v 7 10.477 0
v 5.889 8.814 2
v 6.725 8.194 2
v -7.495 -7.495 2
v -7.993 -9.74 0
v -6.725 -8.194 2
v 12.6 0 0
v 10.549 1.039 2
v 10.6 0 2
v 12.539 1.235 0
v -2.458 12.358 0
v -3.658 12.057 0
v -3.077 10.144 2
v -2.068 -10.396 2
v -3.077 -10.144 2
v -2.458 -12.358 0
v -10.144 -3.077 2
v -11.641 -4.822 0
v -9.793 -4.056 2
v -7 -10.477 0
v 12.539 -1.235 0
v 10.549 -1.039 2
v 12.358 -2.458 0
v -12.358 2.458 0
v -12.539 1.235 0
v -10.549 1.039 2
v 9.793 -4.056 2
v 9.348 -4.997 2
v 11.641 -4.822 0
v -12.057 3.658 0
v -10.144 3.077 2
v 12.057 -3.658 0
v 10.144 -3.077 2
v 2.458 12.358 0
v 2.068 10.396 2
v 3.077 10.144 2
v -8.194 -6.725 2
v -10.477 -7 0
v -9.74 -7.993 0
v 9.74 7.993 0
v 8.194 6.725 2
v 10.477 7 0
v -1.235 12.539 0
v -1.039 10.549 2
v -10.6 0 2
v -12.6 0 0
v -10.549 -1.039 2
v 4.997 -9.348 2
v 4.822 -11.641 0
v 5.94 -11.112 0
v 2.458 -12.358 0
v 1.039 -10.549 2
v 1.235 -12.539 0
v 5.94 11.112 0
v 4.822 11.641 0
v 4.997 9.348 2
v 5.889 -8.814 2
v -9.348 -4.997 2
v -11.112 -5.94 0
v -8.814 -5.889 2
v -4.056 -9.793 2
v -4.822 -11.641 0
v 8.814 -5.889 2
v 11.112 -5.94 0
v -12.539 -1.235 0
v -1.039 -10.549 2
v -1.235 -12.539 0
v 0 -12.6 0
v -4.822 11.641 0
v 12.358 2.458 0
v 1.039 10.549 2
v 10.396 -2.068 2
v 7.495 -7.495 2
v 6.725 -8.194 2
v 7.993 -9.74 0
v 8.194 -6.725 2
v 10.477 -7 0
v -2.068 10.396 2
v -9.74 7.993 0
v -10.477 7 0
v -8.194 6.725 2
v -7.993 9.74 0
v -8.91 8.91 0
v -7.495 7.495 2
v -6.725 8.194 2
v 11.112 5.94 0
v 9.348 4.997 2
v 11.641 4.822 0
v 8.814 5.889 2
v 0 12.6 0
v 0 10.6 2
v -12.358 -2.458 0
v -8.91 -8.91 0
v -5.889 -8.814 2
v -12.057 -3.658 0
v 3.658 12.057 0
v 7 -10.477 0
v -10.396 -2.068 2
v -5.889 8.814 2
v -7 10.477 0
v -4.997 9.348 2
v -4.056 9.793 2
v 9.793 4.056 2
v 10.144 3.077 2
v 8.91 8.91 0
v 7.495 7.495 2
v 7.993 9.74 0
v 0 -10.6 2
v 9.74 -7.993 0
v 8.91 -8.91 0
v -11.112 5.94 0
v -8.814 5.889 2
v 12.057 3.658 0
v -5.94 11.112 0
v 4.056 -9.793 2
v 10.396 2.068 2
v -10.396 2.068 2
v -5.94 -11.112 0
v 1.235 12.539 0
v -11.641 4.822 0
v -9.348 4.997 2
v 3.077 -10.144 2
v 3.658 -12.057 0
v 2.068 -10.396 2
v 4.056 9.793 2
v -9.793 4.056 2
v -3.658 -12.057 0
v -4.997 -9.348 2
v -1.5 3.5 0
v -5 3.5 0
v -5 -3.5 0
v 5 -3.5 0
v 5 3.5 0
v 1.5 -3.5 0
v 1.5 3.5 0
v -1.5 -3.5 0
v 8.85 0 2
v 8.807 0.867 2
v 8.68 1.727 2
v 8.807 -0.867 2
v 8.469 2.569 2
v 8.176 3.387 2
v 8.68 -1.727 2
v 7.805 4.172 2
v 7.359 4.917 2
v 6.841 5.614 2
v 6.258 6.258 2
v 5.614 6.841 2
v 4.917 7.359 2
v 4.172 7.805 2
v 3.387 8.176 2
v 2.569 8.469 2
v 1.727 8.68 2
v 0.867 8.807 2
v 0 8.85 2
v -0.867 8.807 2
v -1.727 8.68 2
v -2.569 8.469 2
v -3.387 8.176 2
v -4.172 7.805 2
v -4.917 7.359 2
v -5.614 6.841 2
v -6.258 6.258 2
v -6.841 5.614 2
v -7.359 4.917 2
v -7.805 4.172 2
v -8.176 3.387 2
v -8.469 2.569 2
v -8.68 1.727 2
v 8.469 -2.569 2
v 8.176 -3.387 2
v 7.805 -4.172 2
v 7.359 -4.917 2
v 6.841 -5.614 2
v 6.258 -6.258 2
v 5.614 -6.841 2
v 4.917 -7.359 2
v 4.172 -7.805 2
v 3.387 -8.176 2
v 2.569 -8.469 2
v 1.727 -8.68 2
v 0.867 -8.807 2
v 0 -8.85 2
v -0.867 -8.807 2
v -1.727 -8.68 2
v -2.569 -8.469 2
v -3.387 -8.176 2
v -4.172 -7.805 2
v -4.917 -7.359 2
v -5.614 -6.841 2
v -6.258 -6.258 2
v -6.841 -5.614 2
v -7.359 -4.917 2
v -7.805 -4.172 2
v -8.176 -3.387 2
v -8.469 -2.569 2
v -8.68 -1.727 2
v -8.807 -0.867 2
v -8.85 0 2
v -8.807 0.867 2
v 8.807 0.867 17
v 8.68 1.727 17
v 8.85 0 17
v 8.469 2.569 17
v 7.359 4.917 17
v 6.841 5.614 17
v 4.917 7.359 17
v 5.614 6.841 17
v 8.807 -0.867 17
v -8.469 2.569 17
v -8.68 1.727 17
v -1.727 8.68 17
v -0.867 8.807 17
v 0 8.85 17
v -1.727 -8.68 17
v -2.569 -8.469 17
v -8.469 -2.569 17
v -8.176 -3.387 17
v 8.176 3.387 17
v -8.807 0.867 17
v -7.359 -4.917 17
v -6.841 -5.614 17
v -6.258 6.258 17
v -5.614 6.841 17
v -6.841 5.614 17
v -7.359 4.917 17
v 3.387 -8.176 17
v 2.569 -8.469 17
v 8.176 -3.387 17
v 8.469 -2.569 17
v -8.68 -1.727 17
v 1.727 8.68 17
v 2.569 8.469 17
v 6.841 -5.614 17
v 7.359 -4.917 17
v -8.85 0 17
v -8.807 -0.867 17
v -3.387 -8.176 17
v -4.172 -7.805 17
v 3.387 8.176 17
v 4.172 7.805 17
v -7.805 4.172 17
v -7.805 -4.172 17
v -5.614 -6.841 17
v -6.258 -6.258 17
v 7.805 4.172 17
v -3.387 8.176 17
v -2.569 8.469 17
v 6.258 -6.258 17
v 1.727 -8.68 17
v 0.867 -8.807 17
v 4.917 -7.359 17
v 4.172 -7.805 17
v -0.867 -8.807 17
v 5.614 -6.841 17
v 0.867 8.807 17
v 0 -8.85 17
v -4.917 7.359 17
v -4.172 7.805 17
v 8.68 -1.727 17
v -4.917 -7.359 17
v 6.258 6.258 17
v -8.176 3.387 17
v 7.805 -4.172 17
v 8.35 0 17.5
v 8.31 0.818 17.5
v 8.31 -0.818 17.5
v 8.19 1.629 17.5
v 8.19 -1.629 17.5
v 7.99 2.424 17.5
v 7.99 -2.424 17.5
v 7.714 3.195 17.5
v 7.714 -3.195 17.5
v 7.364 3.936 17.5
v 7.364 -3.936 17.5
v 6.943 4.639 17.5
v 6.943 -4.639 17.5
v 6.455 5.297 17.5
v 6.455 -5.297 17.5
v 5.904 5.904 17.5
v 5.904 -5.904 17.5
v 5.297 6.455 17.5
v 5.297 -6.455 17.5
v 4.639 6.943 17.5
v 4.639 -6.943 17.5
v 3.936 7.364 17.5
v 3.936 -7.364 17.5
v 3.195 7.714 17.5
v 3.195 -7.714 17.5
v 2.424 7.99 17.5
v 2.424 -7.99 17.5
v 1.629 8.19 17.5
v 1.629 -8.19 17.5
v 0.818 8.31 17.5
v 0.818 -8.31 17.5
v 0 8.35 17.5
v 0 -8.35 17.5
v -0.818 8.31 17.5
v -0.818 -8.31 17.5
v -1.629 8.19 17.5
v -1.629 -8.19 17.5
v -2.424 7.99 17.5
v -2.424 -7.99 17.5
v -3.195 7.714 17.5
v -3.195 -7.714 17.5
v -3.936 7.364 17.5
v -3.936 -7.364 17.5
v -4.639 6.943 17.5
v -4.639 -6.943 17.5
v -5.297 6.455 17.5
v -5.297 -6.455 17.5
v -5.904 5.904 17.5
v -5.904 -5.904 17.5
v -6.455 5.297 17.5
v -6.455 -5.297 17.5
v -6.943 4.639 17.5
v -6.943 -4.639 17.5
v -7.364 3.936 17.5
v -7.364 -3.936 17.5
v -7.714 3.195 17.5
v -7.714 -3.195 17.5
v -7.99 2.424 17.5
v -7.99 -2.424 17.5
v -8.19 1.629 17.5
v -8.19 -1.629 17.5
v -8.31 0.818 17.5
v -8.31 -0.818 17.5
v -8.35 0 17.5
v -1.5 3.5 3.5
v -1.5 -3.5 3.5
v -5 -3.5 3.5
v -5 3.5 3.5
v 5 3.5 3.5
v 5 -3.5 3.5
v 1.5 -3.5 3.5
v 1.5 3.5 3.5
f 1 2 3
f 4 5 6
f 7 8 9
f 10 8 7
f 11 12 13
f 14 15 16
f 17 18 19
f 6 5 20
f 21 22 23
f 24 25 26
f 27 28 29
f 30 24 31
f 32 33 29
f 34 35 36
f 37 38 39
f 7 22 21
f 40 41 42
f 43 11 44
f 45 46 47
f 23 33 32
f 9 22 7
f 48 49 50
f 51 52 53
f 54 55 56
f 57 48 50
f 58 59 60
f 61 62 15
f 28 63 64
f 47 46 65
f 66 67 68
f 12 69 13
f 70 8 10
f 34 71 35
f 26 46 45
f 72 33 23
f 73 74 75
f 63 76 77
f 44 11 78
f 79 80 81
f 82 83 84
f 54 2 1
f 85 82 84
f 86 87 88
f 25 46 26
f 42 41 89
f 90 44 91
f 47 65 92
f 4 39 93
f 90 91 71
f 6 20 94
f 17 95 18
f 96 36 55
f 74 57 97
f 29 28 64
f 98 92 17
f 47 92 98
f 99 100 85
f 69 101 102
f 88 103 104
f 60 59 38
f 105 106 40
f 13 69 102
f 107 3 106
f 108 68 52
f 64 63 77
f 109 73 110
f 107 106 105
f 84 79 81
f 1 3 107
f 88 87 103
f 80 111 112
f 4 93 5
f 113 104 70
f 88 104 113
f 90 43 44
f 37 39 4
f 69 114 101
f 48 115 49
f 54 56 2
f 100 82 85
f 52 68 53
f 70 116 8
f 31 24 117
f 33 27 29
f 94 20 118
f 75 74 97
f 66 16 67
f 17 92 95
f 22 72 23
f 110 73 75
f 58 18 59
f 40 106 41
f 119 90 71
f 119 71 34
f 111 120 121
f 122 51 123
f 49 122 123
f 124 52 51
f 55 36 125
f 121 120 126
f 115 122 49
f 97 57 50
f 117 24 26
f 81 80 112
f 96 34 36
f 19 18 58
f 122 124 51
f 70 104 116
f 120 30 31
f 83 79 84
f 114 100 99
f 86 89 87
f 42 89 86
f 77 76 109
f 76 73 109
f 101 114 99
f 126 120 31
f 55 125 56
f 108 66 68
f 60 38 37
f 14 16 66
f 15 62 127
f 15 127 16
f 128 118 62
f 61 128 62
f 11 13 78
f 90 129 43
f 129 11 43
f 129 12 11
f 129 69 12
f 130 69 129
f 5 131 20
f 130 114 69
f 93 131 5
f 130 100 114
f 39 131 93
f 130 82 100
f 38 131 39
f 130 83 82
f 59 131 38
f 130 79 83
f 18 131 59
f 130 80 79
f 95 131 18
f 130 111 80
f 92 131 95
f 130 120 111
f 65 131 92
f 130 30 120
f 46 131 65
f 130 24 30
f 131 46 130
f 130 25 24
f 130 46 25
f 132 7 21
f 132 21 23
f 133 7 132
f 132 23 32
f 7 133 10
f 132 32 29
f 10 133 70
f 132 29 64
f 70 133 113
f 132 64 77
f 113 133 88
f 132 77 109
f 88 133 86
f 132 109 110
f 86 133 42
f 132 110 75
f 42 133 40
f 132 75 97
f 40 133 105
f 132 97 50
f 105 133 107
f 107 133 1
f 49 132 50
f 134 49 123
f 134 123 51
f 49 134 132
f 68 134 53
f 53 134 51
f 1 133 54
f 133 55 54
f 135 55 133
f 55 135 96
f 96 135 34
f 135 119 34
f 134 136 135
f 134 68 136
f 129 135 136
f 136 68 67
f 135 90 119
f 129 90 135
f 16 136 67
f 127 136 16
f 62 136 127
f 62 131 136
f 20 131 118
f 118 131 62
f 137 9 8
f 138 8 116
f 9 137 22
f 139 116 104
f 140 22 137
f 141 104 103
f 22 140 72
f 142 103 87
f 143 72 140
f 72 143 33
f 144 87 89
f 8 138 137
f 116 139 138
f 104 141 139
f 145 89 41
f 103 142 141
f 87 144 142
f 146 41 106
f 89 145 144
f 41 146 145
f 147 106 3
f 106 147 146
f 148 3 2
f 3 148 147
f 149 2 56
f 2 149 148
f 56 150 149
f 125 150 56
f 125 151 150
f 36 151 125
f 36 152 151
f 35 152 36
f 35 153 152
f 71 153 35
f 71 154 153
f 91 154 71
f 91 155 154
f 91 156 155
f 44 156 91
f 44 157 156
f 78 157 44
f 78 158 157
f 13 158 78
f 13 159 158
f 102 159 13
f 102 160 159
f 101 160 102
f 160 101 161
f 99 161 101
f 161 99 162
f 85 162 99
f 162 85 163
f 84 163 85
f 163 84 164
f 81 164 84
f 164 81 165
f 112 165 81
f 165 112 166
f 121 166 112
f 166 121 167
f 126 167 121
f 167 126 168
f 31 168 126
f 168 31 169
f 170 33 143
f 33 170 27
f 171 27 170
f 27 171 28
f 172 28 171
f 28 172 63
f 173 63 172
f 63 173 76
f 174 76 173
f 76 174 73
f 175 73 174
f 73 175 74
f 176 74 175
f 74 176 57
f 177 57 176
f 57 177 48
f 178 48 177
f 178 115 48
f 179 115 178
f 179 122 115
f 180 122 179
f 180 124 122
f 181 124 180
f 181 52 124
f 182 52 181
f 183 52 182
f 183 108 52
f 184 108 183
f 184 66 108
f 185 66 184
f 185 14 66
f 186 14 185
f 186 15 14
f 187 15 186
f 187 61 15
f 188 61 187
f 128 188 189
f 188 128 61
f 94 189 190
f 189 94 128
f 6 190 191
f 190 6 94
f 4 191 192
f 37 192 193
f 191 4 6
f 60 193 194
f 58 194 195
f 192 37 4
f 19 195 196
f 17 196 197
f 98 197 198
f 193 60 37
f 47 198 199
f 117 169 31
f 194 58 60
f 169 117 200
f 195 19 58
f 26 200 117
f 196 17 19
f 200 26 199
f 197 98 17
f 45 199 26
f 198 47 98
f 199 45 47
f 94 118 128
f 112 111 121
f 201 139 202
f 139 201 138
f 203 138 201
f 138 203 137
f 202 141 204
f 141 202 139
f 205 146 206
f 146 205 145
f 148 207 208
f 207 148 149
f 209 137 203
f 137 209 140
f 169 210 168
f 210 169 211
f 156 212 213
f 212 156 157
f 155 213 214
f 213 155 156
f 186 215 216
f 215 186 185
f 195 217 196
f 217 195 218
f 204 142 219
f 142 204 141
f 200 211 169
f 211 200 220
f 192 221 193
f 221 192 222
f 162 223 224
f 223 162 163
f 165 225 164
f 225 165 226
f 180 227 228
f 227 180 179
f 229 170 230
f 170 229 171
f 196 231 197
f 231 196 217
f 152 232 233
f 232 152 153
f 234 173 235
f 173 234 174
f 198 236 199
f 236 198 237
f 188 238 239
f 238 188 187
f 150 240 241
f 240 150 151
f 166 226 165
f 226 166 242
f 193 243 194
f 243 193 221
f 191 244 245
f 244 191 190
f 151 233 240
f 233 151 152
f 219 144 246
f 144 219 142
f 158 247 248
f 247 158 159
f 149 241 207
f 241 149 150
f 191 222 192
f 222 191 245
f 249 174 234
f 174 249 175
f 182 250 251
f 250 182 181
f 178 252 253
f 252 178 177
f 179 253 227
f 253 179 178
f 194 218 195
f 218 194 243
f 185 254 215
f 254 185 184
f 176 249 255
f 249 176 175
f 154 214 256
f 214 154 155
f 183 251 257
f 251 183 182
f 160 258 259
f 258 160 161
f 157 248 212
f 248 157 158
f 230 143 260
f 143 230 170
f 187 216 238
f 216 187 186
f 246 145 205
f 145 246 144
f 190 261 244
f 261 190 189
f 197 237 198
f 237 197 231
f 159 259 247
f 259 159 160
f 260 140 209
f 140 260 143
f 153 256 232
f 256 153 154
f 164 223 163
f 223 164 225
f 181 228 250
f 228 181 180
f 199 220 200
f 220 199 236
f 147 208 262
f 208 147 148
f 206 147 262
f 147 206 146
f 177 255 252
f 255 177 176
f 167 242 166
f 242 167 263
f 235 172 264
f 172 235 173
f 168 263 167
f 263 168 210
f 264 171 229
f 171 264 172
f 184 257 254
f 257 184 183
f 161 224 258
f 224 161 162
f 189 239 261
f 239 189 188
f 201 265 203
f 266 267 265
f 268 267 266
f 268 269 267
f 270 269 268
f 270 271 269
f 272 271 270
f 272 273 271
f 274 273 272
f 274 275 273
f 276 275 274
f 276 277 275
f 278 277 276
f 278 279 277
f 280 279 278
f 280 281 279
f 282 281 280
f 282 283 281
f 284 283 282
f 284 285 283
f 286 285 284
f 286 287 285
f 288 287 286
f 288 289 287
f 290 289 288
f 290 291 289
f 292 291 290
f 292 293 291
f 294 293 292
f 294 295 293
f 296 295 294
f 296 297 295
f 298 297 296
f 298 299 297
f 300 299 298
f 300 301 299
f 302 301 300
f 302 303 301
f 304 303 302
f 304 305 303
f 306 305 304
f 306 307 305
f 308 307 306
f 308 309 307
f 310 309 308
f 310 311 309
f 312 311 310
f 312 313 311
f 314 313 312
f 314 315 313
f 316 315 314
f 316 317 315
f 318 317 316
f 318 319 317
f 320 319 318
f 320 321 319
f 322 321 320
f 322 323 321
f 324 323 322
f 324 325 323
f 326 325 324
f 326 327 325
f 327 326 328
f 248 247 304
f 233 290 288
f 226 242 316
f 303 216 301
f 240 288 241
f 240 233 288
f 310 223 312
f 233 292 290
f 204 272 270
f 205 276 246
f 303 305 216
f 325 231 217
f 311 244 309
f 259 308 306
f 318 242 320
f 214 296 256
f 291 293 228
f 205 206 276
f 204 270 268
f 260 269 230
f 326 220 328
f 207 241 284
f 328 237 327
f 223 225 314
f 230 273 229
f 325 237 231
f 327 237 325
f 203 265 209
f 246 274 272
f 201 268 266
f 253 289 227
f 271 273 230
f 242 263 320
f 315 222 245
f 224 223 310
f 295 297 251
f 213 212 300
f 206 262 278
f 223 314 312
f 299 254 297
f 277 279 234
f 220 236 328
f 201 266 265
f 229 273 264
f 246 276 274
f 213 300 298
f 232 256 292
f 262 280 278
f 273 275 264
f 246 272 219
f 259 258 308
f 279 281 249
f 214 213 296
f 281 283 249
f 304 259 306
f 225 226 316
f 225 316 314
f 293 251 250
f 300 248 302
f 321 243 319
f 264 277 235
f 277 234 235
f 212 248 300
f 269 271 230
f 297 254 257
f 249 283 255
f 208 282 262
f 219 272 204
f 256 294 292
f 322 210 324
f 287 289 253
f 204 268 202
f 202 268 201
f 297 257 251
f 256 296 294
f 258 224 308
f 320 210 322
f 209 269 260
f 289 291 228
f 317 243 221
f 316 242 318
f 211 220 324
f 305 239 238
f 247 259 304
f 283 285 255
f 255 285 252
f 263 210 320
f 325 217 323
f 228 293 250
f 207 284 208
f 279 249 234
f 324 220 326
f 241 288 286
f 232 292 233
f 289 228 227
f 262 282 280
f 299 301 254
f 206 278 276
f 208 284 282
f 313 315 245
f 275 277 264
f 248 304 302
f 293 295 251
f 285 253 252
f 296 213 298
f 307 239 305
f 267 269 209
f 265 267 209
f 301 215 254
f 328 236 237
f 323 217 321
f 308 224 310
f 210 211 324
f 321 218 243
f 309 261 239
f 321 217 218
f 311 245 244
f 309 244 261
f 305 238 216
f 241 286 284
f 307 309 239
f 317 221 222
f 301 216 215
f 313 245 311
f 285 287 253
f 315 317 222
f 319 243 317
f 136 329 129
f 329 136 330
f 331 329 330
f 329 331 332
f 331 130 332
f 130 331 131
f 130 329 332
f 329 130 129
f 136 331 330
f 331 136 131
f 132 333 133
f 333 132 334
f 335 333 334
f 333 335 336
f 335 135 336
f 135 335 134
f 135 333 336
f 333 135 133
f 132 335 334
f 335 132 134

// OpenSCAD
// =====================================
// Bench Dog Blank
// Flush plug for countersunk 18mm bench dog holes in 18mm ply
// Removal: needle-nose pliers grip the bar between the two top notches
// Modeled top-face-down: prints flat on the bed, no supports
// =====================================

$fn = 64;

// ---- Parameters (mm) ----
hole_d = 18;        // bench dog hole diameter (caliper)
top_d = 26.5;       // countersink opening diameter at the surface (caliper)
taper_depth = 2.5;  // depth of the 45-degree head taper below the surface
ply_thickness = 18; // bench top plywood thickness = total blank height
clearance = 0.3;    // diametral fit clearance applied to all outer diameters
lead_in = 0.5;      // 45-degree insertion chamfer on the shaft's free end
top_trim = 0.5;     // shaved off the top face so blanks sit flush instead of proud

// ---- Pliers grip recess (fixed grip detail, not customized) ----
notch_w = 3.5;      // width of each notch, across the grip bar
notch_len = 7;      // length of each notch, along the grip bar
notch_depth = 3.5;  // notch depth below the top face
bar_w = 3;          // grip bar left between the notches, flush with the top face

// ---- Derived (45-degree taper: base shrinks 2*taper_depth) ----
head_base_d = top_d - 2 * taper_depth;   // 21.5 at defaults
shaft_d = hole_d - clearance;            // 17.7 at defaults
// Head frustum height after trimming top_trim off its (bed-side) top face
head_h = taper_depth - top_trim;
// Frustum diameter at the trimmed top face (linear interpolation along the taper)
head_top_d = (top_d - clearance) + (head_base_d - top_d) * (top_trim / taper_depth);

assert(head_base_d - clearance >= shaft_d,
       "taper_depth too deep: head base is narrower than the shaft");
assert(head_h > 0, "top_trim must be less than taper_depth");

// farthest corner of a notch must stay inside the shaft wall
notch_reach = sqrt(pow(bar_w / 2 + notch_w, 2) + pow(notch_len / 2, 2));
assert(notch_reach <= shaft_d / 2 - 1.2,
       "hole_d too small for the pliers grip notches");

module bench_dog_blank() {
    difference() {
        union() {
            // Head frustum: bed face is the bench-top face, top_trim already
            // shaved off so it sits flush instead of proud, tapering inward
            // at 45 degrees
            cylinder(d1 = head_top_d, d2 = head_base_d - clearance,
                     h = head_h);
            // Shaft, stopping short of full height by the lead-in chamfer
            translate([0, 0, head_h])
                cylinder(d = shaft_d, h = ply_thickness - taper_depth - lead_in);
            // Insertion lead-in chamfer at the shaft's free end
            translate([0, 0, ply_thickness - top_trim - lead_in])
                cylinder(d1 = shaft_d, d2 = shaft_d - 2 * lead_in, h = lead_in);
        }
        // Two rectangular notches flanking the grip bar: needle-nose jaws
        // drop into the notches and close on the bar to pull the blank
        for (s = [-1, 1])
            translate([s * (bar_w + notch_w) / 2, 0, notch_depth / 2 - 0.01])
                cube([notch_w, notch_len, notch_depth + 0.02], center = true);
    }
}

bench_dog_blank();
